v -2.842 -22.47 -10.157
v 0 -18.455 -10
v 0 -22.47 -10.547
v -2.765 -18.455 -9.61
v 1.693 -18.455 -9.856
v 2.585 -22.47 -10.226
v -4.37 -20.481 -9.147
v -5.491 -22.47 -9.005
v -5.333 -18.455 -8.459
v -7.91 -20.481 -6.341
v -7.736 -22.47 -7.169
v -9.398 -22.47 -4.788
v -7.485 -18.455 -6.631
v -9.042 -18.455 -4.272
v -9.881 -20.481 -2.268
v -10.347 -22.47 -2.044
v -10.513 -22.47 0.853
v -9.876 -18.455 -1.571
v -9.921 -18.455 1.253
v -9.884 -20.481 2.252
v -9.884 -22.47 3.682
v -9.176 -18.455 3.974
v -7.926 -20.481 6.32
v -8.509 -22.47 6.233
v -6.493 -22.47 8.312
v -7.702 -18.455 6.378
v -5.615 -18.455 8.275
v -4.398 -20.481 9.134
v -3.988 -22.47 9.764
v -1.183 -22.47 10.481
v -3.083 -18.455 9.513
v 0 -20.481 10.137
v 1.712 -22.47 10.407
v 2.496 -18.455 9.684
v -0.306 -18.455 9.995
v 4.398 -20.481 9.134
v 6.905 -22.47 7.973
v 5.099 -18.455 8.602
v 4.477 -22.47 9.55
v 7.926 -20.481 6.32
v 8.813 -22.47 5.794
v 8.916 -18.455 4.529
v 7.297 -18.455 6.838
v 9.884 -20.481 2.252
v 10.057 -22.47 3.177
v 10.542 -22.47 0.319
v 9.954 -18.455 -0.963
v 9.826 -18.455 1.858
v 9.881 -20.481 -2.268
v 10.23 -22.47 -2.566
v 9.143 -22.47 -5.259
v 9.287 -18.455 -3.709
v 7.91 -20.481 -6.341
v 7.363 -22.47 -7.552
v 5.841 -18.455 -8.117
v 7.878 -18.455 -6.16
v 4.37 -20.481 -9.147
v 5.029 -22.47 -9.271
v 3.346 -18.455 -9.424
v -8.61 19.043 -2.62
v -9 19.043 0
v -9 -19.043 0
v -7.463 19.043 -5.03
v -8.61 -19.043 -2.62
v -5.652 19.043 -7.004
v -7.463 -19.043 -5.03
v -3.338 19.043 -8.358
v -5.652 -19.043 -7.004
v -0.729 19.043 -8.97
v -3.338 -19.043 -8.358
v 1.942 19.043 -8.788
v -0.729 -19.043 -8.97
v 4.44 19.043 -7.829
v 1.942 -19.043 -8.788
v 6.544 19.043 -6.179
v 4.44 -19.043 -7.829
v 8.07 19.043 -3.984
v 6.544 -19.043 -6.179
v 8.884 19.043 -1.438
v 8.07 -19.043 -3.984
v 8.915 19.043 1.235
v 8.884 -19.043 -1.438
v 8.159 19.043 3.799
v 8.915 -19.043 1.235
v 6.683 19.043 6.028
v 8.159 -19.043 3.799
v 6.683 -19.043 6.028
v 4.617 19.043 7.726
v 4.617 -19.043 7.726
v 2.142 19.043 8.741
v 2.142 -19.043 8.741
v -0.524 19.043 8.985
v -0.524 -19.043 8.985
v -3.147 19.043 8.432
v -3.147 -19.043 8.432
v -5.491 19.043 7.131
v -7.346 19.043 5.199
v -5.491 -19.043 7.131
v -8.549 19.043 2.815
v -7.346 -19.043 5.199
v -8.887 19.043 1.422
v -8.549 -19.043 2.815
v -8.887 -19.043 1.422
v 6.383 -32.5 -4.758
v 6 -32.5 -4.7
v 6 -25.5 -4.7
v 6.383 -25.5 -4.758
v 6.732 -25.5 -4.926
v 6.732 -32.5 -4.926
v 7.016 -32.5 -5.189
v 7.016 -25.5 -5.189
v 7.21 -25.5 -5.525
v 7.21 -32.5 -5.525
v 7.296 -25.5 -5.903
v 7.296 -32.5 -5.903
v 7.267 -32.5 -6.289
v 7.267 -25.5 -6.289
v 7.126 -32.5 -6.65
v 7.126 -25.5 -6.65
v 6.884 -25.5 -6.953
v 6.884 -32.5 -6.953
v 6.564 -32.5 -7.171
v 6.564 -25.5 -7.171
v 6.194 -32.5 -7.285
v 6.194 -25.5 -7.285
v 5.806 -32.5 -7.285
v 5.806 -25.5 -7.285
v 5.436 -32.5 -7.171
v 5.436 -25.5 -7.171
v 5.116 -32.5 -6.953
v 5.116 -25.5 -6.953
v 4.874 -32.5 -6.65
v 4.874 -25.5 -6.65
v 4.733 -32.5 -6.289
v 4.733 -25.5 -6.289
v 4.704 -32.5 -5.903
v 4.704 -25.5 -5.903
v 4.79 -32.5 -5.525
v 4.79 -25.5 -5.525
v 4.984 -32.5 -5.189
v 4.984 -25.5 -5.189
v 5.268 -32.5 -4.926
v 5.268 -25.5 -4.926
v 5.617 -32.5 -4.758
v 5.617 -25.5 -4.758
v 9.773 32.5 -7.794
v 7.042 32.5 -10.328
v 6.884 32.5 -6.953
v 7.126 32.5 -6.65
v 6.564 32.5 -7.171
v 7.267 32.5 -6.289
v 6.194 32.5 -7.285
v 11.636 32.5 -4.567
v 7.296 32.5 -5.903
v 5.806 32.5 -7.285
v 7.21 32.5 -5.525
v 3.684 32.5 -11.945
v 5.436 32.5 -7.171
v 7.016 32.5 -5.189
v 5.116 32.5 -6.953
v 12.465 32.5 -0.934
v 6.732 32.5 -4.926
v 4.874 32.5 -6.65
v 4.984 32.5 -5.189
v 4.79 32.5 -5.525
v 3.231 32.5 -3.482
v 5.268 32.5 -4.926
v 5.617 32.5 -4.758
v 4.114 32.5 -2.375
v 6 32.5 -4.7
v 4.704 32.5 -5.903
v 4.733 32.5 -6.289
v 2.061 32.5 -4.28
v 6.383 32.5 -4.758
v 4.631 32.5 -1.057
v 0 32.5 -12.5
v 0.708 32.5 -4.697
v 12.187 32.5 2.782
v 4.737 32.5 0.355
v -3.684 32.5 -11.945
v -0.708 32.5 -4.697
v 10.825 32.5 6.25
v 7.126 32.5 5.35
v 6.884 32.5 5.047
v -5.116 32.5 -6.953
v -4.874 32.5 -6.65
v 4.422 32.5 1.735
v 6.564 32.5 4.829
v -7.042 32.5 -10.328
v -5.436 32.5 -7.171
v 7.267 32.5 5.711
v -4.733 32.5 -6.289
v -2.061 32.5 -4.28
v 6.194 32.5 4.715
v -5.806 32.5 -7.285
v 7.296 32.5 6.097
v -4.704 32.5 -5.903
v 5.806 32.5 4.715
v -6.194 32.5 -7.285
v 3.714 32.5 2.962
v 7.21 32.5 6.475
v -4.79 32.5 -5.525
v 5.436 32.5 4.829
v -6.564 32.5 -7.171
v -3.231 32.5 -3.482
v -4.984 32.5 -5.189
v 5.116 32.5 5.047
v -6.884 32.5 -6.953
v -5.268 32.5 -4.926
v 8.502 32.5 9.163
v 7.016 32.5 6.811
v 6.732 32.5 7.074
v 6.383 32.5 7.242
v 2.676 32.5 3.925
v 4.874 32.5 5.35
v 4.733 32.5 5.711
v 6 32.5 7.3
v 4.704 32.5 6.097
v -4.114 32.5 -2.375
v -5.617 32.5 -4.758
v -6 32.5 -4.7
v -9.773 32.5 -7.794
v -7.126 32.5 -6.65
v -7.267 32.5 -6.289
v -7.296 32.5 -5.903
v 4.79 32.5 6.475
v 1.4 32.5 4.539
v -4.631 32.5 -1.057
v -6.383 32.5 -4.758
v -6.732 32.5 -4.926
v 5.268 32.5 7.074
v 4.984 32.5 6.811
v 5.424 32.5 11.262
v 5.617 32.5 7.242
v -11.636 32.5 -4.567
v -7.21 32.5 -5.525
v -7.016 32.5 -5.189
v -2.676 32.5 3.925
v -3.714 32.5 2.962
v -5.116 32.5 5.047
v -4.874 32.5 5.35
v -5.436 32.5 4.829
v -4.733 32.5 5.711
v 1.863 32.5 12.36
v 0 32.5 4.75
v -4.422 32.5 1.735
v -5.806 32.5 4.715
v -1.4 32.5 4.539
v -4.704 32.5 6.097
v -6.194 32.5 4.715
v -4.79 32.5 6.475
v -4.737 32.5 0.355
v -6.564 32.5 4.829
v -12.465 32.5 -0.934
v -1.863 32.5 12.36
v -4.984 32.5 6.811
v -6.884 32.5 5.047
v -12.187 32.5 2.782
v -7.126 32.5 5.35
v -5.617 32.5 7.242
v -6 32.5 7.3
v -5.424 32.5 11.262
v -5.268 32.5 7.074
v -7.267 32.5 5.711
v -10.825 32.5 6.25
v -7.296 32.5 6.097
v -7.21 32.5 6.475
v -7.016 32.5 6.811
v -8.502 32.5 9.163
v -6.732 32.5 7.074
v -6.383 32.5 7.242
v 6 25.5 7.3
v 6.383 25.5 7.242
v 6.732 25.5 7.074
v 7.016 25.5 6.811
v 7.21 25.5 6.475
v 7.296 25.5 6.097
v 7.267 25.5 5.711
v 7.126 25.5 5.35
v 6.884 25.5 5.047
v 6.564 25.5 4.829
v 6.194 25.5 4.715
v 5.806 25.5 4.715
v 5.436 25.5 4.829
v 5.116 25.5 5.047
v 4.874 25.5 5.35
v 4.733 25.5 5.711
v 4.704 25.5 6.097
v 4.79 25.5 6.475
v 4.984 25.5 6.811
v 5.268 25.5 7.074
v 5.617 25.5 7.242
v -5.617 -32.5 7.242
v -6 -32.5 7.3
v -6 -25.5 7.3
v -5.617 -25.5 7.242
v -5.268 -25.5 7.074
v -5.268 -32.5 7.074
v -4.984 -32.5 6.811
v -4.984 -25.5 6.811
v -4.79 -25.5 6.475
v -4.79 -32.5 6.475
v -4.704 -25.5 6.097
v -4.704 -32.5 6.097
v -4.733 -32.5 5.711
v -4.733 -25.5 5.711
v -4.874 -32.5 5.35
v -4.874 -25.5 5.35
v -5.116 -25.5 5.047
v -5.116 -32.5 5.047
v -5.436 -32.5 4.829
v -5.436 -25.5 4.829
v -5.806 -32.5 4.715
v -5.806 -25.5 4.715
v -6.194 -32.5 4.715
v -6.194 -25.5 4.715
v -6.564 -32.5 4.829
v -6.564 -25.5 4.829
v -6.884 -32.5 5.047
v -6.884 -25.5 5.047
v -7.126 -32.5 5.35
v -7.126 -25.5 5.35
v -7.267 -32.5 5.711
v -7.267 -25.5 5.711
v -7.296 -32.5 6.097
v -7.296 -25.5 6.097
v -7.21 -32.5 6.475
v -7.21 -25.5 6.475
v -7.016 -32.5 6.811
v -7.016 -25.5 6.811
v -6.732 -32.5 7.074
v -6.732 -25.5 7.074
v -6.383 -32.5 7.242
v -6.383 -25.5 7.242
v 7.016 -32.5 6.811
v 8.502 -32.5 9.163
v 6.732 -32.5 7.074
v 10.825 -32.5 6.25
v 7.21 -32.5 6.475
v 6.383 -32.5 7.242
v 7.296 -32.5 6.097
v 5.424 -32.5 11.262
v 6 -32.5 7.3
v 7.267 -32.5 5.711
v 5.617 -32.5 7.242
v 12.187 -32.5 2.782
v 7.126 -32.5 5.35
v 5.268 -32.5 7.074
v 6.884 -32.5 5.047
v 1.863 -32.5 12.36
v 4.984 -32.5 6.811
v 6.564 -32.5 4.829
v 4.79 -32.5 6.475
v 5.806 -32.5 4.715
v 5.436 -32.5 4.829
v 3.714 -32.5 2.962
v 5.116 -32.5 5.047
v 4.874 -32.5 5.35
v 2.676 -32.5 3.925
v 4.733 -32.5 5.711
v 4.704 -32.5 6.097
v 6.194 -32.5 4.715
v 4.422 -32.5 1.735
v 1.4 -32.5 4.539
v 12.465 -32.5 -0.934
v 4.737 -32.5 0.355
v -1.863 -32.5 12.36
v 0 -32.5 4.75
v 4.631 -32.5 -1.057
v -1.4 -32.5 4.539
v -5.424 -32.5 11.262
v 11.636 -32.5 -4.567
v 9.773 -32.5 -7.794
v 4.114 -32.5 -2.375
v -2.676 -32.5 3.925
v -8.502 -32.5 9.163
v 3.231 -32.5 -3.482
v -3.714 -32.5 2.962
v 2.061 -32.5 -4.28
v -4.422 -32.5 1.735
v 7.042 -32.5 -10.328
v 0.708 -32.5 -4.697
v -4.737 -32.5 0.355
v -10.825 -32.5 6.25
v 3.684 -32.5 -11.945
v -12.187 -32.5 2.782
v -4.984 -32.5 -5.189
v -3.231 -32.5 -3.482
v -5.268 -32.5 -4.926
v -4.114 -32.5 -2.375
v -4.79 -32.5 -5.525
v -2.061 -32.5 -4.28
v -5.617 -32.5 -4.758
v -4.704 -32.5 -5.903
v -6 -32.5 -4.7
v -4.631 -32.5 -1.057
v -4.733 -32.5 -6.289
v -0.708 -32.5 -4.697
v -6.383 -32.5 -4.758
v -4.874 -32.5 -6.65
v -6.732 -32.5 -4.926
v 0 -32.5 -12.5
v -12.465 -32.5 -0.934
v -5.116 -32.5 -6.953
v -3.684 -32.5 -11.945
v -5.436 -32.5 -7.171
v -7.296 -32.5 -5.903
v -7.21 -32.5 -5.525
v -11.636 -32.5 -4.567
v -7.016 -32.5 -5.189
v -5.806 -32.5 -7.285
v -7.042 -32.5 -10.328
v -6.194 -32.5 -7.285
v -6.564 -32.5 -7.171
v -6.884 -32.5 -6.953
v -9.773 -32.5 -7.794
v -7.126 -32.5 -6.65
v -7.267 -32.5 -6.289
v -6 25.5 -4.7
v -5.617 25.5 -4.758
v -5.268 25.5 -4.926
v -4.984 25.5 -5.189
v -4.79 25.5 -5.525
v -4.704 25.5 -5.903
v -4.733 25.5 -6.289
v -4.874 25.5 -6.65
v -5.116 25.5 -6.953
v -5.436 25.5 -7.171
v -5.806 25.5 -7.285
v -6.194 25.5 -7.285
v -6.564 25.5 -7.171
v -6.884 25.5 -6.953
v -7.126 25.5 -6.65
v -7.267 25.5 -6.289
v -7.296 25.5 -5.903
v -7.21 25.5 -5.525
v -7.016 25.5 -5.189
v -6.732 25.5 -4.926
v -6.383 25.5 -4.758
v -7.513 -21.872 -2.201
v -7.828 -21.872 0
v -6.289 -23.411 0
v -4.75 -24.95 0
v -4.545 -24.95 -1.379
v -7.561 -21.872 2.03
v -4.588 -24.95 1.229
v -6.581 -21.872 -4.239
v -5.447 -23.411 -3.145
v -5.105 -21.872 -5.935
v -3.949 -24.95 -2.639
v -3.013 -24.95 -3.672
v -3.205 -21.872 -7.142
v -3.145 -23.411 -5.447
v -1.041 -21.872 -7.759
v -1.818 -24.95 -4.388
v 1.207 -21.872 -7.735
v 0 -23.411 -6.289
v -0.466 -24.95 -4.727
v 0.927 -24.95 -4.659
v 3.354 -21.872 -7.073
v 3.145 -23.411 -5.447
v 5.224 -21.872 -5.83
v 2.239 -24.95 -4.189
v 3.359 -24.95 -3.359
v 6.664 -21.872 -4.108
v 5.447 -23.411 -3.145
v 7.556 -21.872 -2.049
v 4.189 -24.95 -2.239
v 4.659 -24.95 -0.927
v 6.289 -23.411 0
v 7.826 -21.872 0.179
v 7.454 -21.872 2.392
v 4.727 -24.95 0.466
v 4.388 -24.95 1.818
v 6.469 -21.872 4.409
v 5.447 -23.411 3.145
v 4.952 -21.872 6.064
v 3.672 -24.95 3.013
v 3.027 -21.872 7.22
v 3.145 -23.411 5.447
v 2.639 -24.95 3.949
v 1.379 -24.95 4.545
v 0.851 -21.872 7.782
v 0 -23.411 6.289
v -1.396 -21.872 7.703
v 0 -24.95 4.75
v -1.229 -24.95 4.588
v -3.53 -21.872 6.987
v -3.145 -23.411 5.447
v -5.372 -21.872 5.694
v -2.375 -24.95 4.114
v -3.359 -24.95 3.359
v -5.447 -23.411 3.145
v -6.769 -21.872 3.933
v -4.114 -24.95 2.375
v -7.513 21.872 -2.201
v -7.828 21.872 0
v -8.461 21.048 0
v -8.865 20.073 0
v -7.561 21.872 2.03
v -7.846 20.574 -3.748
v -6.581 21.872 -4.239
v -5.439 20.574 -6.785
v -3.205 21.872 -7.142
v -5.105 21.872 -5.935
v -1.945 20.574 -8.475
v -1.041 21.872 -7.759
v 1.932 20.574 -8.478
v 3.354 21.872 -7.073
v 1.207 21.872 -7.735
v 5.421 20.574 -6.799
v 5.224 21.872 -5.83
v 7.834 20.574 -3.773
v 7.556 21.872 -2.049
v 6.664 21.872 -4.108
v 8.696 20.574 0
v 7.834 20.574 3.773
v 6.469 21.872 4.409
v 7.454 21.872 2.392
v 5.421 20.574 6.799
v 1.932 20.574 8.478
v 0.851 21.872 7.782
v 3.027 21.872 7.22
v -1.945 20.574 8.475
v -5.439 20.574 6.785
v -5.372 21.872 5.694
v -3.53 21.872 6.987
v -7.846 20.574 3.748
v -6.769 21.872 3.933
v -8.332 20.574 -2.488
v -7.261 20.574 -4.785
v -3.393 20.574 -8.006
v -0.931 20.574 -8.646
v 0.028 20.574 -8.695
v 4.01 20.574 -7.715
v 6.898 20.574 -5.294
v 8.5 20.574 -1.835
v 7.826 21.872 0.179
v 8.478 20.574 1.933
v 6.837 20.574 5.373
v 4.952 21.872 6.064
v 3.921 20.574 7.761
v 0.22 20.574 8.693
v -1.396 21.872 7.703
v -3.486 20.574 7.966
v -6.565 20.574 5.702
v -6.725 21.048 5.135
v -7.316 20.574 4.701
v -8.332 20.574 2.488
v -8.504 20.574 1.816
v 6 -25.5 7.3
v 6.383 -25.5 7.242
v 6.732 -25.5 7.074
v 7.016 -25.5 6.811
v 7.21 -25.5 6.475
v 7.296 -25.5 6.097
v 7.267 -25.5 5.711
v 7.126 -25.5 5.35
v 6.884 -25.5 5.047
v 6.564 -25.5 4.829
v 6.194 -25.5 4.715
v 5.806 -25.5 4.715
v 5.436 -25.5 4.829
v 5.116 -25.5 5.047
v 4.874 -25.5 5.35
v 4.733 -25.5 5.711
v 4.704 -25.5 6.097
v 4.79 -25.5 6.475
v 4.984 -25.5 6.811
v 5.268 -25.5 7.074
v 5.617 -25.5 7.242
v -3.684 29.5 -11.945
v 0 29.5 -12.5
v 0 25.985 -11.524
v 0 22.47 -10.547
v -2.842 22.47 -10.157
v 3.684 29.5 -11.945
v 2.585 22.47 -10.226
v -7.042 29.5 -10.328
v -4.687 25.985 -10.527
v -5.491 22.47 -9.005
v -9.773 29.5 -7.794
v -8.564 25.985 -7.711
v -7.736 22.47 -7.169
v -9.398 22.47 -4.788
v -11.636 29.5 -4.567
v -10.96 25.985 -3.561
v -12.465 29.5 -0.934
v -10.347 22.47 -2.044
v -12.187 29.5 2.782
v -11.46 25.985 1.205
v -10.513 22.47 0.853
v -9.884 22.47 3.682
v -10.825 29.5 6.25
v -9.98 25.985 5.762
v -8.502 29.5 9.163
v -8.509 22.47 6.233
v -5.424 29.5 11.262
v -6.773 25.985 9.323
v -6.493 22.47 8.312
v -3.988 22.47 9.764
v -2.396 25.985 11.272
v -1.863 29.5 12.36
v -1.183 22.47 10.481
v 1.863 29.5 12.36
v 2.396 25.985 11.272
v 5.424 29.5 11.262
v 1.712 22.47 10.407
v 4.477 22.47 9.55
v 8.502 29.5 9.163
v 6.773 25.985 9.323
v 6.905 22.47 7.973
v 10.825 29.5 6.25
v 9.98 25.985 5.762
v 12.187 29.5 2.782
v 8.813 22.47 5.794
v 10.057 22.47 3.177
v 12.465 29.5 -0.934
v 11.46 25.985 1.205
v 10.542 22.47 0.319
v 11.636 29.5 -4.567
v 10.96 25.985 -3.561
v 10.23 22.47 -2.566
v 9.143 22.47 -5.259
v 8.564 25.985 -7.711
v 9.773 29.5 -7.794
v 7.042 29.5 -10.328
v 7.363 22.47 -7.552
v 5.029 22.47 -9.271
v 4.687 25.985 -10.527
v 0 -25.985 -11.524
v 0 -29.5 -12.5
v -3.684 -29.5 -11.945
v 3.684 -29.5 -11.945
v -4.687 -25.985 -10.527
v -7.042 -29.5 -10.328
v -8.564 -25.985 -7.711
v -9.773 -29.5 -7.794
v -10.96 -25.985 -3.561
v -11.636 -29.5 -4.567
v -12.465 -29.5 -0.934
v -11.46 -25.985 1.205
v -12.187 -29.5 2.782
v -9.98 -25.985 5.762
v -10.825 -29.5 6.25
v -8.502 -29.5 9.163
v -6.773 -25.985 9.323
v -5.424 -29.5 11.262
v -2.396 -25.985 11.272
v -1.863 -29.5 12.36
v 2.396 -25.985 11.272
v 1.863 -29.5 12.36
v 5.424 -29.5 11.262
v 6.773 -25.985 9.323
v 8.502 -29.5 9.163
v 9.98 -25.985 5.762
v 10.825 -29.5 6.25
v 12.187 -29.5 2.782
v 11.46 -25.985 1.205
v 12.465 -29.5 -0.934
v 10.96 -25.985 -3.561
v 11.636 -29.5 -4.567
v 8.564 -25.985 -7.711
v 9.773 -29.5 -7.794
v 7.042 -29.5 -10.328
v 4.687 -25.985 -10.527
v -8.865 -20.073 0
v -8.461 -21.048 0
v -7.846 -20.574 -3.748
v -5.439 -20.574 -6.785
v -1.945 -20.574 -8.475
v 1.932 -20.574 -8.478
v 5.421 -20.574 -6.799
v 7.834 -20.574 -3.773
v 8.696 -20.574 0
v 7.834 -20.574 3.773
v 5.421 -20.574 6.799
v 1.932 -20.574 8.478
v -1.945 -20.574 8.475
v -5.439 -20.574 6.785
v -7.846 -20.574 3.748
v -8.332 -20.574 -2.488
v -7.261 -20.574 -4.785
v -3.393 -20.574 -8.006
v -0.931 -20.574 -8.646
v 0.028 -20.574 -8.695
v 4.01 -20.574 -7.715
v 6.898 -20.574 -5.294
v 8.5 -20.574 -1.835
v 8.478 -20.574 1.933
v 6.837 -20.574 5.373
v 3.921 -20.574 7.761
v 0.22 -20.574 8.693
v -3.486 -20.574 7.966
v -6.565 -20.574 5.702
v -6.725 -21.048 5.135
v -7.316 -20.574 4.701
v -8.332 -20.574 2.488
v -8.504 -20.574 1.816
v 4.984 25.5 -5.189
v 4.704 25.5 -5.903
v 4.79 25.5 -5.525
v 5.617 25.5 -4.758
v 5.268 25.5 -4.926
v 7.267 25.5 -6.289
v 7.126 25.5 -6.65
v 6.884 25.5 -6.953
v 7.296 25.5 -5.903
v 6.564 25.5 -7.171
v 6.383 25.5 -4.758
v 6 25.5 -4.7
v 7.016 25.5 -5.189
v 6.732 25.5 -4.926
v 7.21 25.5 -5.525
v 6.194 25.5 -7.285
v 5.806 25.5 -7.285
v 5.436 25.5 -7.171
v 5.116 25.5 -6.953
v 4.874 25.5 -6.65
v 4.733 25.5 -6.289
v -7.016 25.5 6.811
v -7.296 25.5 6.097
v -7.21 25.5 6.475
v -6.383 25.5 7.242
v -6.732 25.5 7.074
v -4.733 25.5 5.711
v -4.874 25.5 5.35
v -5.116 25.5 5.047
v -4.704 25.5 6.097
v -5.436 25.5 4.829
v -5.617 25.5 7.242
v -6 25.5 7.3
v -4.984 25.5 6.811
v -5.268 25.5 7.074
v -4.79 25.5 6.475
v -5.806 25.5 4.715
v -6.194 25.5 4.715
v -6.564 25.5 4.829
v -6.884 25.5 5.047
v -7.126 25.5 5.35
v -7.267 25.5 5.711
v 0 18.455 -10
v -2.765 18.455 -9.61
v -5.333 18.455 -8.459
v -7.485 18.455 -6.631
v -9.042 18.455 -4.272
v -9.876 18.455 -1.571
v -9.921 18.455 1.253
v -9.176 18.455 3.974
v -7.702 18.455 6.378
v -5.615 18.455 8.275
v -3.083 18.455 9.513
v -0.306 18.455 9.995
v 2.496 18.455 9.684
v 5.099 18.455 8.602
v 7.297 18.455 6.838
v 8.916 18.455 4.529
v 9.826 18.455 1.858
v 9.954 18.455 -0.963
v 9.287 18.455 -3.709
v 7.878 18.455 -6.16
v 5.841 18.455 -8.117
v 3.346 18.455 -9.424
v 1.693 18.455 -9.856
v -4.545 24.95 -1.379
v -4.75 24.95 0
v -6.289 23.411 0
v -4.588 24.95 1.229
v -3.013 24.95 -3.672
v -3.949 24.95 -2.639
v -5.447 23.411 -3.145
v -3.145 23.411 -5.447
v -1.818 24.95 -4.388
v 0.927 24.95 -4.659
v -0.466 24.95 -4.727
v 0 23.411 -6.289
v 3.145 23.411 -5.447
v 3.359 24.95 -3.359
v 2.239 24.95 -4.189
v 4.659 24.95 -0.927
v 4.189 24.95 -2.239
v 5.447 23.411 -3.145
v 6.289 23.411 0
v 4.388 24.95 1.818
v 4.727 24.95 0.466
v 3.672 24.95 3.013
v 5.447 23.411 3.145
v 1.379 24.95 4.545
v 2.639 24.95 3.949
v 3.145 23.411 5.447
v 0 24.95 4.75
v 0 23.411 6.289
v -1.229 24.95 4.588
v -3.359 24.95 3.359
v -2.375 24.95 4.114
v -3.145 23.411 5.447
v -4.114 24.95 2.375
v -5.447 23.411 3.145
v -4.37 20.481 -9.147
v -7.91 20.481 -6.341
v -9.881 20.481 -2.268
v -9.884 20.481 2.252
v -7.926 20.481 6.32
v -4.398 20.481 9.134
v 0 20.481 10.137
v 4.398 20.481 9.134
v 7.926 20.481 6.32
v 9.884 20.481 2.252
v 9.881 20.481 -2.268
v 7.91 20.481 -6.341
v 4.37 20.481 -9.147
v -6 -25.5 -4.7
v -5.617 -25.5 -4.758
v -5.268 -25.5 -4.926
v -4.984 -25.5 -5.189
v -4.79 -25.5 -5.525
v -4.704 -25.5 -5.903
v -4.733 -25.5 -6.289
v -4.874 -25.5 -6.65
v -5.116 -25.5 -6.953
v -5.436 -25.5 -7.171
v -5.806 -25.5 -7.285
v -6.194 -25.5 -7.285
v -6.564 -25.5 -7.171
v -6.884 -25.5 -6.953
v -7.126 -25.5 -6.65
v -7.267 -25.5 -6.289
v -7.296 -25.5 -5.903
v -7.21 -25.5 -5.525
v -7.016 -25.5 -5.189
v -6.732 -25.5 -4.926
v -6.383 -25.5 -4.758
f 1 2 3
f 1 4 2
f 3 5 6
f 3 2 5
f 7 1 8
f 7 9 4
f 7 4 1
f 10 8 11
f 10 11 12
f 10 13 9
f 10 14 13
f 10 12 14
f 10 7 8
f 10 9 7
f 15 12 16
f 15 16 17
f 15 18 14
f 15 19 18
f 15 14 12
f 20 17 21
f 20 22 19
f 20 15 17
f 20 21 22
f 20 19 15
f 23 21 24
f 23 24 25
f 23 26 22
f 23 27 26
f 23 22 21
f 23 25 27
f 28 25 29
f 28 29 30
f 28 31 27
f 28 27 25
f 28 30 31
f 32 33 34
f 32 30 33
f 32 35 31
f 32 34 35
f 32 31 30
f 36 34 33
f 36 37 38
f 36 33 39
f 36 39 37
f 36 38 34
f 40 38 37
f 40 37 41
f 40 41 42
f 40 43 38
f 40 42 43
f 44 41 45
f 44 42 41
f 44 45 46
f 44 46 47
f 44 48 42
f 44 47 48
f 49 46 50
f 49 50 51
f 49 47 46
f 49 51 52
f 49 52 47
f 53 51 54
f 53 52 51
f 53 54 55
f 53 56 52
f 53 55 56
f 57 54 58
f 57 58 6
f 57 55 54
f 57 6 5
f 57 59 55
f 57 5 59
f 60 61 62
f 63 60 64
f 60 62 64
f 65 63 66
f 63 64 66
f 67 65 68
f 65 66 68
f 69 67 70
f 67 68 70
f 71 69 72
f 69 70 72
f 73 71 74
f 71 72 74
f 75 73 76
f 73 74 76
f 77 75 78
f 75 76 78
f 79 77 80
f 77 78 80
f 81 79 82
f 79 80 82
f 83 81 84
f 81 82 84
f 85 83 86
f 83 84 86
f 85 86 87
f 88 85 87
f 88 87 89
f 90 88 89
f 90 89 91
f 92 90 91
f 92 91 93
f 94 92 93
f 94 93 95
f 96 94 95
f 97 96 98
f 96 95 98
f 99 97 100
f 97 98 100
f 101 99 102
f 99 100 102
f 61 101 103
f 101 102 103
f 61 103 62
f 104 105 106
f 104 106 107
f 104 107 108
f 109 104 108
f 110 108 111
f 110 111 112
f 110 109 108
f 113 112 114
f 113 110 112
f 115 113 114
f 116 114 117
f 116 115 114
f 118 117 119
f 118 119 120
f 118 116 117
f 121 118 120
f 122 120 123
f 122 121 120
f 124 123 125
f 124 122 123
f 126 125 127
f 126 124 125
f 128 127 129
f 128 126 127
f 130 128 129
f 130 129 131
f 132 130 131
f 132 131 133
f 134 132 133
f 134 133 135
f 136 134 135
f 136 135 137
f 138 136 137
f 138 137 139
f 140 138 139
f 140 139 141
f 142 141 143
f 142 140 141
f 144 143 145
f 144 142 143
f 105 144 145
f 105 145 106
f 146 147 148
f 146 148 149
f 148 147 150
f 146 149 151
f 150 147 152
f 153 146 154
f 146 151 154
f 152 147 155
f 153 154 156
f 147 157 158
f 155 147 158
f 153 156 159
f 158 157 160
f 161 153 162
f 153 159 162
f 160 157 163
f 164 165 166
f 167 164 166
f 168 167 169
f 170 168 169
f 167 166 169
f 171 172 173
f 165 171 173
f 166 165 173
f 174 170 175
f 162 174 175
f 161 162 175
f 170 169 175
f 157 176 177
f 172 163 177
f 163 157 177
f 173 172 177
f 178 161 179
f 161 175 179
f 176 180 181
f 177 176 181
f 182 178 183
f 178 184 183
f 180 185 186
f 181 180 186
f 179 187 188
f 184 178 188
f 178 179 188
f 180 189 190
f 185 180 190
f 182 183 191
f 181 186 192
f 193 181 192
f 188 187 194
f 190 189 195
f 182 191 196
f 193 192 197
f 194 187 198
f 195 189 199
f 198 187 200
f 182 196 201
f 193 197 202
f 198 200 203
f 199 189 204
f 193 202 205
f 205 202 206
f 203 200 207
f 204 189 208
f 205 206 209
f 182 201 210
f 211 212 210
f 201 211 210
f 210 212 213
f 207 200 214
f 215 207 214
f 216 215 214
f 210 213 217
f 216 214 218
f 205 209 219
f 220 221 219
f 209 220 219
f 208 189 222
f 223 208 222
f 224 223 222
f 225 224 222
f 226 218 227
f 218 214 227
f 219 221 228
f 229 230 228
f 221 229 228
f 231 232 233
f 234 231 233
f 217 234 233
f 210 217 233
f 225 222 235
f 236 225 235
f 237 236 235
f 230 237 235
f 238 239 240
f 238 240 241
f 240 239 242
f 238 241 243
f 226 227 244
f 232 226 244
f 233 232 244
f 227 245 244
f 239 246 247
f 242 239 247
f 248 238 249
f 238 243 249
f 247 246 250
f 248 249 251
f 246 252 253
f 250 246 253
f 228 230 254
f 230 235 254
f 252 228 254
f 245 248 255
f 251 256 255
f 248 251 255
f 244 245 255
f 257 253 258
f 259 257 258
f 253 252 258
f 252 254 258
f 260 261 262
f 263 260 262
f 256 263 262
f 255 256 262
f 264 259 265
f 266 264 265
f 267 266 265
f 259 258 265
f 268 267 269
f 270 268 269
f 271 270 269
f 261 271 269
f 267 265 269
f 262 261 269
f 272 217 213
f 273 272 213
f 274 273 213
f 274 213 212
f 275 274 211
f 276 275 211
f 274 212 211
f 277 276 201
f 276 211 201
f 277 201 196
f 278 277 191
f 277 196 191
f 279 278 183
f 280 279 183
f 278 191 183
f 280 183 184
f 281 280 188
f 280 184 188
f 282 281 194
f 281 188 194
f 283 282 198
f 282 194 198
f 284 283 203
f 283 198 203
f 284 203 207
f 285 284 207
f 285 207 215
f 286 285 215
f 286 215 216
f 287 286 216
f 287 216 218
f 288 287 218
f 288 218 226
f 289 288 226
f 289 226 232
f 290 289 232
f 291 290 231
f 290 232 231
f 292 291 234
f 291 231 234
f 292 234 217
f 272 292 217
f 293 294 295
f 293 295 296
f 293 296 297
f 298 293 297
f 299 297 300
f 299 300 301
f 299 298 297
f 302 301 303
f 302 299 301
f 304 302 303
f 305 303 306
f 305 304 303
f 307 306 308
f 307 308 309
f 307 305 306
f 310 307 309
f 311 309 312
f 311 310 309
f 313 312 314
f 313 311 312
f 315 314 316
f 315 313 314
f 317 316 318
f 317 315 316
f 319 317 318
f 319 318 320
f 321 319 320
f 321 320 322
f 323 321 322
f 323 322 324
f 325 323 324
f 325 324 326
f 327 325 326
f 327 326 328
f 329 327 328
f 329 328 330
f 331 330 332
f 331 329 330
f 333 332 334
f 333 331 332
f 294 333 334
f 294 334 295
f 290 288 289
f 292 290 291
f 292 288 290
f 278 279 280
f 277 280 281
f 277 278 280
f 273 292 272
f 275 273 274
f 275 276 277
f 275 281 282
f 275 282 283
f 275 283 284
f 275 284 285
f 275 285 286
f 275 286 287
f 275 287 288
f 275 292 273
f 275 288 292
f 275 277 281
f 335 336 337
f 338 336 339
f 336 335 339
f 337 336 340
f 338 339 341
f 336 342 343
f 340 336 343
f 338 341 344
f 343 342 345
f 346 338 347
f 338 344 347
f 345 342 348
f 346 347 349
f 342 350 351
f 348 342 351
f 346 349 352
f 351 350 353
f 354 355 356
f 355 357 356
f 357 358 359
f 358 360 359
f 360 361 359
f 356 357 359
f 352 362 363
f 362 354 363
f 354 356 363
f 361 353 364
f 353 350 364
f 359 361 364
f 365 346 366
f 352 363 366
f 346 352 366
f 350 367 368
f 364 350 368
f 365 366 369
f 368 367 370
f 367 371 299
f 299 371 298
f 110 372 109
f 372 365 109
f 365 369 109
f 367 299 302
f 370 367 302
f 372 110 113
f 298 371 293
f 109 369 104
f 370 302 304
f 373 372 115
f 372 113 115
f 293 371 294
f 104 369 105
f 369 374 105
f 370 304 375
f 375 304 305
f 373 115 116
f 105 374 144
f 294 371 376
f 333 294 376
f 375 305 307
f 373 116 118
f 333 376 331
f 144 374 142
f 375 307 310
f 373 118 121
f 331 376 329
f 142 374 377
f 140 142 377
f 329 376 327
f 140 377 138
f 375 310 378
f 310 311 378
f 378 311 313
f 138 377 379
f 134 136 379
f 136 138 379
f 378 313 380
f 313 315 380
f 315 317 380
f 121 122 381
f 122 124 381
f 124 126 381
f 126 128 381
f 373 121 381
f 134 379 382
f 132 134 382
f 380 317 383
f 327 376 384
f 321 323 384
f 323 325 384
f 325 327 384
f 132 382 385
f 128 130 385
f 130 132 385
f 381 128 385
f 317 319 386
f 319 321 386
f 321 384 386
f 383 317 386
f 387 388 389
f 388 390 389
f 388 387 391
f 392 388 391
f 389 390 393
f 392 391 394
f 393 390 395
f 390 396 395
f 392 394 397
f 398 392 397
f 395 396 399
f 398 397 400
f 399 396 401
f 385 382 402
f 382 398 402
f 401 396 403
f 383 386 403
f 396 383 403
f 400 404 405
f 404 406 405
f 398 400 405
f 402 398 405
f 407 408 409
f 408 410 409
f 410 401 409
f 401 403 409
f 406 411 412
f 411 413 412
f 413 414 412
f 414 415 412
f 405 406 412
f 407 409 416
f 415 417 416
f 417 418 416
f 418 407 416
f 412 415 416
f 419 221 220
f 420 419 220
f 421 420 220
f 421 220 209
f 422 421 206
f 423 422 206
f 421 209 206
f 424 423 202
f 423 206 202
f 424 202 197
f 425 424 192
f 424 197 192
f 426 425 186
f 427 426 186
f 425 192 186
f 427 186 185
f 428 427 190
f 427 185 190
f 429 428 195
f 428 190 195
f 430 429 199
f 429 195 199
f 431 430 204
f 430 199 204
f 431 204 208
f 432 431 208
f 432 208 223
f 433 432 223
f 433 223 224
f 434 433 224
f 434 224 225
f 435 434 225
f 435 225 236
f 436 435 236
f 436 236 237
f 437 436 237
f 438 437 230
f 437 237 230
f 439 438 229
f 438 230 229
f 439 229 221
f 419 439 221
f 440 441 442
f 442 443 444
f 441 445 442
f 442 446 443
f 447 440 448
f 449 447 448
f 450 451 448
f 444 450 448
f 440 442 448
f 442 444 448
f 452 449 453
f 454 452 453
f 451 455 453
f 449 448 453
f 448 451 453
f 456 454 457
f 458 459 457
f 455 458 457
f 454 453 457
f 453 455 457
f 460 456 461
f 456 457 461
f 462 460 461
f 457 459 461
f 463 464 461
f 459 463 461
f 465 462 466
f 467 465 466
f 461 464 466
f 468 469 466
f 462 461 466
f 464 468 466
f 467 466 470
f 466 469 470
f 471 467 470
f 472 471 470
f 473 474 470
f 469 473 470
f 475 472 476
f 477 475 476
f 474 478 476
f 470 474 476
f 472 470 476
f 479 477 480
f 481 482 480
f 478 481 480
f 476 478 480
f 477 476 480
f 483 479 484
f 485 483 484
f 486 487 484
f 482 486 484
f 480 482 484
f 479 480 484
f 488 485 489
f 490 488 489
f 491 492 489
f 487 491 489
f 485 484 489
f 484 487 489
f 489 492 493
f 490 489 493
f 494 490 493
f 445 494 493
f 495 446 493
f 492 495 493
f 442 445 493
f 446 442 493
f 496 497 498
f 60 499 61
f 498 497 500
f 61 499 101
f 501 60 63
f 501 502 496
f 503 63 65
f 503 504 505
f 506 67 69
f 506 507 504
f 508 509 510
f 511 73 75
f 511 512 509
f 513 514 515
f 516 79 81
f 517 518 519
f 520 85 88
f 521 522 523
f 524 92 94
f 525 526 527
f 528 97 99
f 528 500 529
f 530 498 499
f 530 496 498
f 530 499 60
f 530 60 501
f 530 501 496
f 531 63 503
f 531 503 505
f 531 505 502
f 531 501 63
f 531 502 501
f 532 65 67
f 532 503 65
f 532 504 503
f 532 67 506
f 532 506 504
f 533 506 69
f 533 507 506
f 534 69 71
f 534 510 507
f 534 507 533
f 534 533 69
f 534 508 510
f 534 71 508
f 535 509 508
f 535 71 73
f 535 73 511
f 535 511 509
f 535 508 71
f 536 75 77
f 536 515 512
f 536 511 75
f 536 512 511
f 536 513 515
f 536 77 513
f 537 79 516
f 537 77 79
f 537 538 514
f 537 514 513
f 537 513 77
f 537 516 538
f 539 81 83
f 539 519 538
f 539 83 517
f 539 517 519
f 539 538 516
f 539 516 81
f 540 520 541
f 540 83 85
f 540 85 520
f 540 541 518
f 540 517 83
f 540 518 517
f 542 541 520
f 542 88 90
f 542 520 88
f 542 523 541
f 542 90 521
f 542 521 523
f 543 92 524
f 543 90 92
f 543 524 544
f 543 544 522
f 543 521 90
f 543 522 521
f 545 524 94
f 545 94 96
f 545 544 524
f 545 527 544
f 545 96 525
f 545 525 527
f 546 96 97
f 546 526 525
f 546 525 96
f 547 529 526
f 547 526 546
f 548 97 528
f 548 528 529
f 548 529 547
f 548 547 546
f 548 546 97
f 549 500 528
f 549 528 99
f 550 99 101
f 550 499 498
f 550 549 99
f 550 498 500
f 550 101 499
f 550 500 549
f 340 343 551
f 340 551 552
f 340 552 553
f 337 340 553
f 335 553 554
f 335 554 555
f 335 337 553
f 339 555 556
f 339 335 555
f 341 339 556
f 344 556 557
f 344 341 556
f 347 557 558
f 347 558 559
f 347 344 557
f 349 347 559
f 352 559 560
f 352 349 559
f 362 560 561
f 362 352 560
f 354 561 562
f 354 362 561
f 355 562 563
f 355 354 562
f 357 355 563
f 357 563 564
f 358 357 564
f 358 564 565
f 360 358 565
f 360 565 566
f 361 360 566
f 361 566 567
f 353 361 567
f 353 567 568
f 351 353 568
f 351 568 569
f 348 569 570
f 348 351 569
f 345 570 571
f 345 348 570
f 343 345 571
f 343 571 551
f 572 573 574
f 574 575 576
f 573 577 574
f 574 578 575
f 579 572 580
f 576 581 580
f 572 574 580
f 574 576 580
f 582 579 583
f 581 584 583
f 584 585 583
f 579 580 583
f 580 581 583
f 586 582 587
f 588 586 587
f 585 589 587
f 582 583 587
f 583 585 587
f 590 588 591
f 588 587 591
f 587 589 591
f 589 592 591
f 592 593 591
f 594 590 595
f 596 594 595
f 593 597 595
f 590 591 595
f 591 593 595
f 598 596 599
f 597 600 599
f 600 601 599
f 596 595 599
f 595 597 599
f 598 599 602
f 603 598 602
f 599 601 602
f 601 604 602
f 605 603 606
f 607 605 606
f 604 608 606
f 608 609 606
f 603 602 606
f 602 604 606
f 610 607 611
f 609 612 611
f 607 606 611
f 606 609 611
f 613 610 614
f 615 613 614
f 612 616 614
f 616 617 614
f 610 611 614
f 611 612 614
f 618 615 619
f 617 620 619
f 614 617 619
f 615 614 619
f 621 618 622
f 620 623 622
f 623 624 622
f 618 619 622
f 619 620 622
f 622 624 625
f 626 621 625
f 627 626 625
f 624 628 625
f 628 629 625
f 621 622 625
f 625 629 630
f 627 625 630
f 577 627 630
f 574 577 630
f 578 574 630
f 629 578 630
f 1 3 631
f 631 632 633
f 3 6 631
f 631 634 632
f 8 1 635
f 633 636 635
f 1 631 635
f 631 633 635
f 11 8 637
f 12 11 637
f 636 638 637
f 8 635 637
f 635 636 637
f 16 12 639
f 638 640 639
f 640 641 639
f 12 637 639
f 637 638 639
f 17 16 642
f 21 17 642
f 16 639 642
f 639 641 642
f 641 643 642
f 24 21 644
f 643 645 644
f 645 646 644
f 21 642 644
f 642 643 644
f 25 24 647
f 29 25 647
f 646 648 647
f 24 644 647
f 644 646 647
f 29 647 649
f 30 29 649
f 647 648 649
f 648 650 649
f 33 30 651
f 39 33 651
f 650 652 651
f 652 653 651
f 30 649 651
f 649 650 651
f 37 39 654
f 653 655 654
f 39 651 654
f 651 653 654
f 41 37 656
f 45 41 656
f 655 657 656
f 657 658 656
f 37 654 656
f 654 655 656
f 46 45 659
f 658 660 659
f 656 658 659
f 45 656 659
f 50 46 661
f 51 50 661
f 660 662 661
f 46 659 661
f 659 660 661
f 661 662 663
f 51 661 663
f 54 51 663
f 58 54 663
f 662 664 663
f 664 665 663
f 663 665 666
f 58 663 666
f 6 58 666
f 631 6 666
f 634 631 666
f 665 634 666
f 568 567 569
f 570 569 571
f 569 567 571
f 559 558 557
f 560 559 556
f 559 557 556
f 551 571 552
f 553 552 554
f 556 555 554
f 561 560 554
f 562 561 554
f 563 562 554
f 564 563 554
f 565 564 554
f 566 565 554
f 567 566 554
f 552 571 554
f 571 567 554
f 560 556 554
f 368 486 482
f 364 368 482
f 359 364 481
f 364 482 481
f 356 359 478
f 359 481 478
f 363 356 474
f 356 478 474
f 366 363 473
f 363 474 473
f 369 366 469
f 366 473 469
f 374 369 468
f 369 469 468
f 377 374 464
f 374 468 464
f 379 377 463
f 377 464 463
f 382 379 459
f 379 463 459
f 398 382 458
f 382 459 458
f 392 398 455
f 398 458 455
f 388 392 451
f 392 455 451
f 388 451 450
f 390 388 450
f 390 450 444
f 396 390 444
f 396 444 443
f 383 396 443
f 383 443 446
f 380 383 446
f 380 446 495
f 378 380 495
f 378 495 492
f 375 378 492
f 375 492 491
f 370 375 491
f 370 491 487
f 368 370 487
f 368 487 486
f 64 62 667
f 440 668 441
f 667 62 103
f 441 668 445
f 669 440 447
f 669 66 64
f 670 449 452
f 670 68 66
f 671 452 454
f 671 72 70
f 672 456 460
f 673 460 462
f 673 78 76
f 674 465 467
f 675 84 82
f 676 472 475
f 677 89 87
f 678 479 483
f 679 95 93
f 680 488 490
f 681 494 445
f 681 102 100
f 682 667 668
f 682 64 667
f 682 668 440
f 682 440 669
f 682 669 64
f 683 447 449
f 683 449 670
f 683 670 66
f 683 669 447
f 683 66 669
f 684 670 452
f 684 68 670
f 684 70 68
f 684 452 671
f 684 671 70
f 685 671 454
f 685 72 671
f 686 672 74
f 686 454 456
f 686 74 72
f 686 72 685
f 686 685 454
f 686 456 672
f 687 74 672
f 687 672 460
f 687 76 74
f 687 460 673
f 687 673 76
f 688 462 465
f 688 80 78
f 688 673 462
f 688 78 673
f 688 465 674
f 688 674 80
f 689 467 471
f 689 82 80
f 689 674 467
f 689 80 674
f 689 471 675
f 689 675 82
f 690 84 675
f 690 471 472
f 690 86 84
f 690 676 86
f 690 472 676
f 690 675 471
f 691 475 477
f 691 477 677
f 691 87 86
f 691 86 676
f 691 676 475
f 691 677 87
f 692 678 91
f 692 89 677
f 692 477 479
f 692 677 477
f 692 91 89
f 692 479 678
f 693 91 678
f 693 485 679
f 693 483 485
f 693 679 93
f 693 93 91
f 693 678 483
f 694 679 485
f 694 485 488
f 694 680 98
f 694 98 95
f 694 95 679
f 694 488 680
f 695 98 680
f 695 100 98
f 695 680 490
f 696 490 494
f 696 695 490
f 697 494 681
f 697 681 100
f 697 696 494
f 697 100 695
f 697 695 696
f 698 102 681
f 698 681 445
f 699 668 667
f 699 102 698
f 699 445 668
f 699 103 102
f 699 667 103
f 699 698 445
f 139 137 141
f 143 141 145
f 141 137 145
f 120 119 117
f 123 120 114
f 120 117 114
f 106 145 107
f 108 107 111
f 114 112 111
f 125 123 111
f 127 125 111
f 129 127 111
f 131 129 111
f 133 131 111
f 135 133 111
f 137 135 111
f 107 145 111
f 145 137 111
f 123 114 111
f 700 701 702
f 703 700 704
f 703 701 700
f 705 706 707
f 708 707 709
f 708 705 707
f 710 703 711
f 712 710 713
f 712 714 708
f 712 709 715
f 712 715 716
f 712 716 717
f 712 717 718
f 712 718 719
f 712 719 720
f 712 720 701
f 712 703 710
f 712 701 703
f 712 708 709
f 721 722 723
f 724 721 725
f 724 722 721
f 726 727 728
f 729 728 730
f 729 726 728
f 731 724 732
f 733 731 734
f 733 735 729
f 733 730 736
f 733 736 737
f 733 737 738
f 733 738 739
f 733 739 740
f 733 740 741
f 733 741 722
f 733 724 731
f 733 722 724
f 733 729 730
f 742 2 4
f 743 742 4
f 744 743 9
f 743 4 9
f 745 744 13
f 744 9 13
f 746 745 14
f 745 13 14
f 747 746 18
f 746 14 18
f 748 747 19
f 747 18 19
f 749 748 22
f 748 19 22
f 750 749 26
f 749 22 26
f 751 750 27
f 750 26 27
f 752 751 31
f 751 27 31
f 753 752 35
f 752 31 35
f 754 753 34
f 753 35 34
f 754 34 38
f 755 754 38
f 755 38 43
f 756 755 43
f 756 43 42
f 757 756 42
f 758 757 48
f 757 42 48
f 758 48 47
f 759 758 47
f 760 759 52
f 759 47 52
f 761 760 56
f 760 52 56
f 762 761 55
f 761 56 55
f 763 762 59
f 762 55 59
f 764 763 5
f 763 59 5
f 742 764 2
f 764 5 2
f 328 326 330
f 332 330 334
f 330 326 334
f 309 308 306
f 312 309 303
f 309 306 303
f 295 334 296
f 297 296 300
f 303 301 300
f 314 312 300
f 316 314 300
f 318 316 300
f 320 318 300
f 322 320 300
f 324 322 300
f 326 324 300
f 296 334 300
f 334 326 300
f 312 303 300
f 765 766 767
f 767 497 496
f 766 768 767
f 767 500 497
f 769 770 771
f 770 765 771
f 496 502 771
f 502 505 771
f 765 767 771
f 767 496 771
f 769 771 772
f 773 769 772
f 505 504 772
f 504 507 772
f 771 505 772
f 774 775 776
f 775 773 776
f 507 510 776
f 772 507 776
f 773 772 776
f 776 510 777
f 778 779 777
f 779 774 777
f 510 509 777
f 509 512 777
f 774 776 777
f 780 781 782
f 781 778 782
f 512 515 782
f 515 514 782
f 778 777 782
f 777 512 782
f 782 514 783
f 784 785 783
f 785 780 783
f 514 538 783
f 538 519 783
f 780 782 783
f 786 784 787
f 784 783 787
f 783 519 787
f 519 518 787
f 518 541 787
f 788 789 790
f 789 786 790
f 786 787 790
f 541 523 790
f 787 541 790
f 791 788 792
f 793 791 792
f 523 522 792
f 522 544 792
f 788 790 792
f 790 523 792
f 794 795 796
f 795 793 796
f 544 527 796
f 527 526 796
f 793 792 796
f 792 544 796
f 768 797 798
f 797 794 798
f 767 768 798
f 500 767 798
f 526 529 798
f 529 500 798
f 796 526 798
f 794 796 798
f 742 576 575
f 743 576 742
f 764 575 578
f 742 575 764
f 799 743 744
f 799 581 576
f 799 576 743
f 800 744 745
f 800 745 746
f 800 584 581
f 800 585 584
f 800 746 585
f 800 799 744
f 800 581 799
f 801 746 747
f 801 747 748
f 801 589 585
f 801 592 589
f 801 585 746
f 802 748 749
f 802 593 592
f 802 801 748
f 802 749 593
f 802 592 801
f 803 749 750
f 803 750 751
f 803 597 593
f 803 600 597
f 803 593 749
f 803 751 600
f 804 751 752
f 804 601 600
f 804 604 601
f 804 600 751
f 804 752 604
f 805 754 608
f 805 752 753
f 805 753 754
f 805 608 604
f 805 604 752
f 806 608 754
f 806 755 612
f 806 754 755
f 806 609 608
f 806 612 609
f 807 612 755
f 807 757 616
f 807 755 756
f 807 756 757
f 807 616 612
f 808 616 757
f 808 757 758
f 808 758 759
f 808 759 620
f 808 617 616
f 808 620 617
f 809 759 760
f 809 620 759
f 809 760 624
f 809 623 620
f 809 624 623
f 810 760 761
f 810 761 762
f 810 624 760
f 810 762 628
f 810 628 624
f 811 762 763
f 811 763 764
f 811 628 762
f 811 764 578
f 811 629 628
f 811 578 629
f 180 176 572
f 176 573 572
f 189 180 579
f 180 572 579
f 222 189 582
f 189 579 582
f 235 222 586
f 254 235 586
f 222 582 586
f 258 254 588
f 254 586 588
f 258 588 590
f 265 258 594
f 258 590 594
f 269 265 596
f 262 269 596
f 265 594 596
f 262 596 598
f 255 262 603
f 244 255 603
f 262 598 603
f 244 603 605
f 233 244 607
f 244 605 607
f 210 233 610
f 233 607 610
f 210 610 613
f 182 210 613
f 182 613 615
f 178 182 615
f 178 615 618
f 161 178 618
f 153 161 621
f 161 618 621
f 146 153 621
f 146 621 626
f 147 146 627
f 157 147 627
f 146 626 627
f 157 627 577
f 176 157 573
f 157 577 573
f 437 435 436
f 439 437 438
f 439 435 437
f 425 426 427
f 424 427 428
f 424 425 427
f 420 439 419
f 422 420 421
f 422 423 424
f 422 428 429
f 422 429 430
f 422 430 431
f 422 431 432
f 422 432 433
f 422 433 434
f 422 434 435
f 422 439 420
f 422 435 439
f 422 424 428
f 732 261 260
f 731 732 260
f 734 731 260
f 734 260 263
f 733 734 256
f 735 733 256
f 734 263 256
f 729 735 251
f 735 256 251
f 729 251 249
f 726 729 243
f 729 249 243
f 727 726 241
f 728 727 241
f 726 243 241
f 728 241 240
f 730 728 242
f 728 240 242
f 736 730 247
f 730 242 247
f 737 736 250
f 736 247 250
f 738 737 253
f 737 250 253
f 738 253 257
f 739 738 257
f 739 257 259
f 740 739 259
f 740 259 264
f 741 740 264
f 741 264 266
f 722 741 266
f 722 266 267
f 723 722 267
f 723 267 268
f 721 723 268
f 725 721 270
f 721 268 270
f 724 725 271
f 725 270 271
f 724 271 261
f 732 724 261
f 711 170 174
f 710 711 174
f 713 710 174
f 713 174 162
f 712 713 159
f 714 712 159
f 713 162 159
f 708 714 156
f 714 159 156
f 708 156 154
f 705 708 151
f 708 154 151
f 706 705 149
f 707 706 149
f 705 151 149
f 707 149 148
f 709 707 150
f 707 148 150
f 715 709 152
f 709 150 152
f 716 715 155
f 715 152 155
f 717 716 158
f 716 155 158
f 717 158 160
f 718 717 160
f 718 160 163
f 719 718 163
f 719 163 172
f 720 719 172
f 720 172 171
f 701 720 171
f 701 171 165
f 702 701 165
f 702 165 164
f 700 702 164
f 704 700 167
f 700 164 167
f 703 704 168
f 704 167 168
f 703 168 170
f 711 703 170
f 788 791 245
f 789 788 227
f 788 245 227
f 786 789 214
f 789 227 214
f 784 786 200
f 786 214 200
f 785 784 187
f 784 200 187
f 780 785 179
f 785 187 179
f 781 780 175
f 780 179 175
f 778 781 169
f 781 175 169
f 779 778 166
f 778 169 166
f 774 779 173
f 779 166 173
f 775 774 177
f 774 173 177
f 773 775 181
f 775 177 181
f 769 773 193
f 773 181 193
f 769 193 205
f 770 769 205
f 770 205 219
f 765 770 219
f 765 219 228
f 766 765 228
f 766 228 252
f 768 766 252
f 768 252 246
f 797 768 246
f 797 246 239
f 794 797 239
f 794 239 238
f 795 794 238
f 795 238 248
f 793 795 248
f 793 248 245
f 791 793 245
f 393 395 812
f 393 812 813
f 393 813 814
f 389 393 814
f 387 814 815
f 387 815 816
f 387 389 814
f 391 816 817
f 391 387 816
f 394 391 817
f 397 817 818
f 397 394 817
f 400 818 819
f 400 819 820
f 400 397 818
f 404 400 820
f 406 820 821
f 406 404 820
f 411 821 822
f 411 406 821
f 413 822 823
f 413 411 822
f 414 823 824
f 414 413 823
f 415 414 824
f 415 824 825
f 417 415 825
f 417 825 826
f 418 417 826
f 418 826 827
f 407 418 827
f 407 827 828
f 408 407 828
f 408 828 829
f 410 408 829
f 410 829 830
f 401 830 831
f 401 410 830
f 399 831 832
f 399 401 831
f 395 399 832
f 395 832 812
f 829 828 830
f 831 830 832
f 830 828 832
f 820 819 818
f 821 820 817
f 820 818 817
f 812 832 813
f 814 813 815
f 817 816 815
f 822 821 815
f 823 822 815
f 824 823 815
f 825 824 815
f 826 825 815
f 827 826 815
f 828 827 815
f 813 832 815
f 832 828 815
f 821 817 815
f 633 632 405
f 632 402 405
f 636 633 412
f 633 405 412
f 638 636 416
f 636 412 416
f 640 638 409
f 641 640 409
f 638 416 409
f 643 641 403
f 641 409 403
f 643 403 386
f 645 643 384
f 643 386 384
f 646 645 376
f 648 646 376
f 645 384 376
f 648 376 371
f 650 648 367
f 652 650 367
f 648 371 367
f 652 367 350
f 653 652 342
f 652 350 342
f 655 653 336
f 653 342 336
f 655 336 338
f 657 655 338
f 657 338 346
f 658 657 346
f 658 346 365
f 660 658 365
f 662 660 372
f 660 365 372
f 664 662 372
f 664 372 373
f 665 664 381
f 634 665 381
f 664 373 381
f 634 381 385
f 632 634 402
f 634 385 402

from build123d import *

# Parameters (mm, degrees)
SKETCH2_R          = 1.3
CUT_EXTRUDE1_DEPTH = 7
SKETCH5_R          = 4.75
CUT_EXTRUDE2_DEPTH = 68.360967927
FILLET1_R          = 15
FILLET2_R          = 4


with BuildPart() as part:
    # Sketch1 → Revolve1 (revolve)
    with BuildSketch(Plane.XY, mode=Mode.PRIVATE) as revolve1_sk:
        Polygon((0, -32.5), (0, 32.5), (-12.5, 32.5), (-12.5, 29.5), (-10, 20.5), (-10, -20.5), (-12.5, -29.5), (-12.5, -32.5), align=None)
    revolve(revolve1_sk.sketch.rotate(Axis((0, -32.5, 0), (0, 1, 0)), 270), axis=Axis((0, -32.5, 0), (0, 1, 0)))

    # Sketch2 → Cut-Extrude1 (cut)
    with BuildSketch(Plane(origin=(0, 32.5, 0), x_dir=(1, 0, 0), z_dir=(0, 1, 0))):
        with Locations(Location((-6, 6, 0), (0, 0, 270))):
            Circle(SKETCH2_R)
        with Locations(Location((6, 6, 0), (0, 0, 270))):
            Circle(SKETCH2_R)
        with Locations(Location((-6, -6, 0), (0, 0, 270))):
            Circle(SKETCH2_R)
        with Locations(Location((6, -6, 0), (0, 0, 270))):
            Circle(SKETCH2_R)
    cut_extrude1 = extrude(amount=-CUT_EXTRUDE1_DEPTH, mode=Mode.SUBTRACT)

    # Mirror1: Cut-Extrude1 across plane
    add(cut_extrude1.mirror(Plane.ZX), mode=Mode.SUBTRACT)

    # Sketch4 → Cut-Revolve1 (revolve, cut)
    with BuildSketch(Plane.XY):
        Polygon((0, 29.7), (-9, 20.7), (-9, -20.7), (0, -29.7), align=None)
    revolve(axis=Axis((0, 29.7, 0), (0, -1, 0)), mode=Mode.SUBTRACT)

    # Sketch5 → Cut-Extrude2 (cut, through all)
    with BuildSketch(Plane(origin=(0, 32.5, 0), x_dir=(1, 0, 0), z_dir=(0, 1, 0))):
        with Locations(Location((0, 0, 0), (0, 0, 270))):
            Circle(SKETCH5_R)
    extrude(amount=-CUT_EXTRUDE2_DEPTH, mode=Mode.SUBTRACT)

    # Fillet1
    fillet1_edges = [part.edges().sort_by_distance(p)[0] for p in [
        (0, -20.5, 10),
        (0, 20.5, 10),
    ]]
    fillet(fillet1_edges, radius=FILLET1_R)

    # Fillet2
    fillet2_edges = [part.edges().sort_by_distance(p)[0] for p in [
        (9, -20.7, 0),
        (9, 20.7, 0),
    ]]
    fillet(fillet2_edges, radius=FILLET2_R)


solid = part.part
